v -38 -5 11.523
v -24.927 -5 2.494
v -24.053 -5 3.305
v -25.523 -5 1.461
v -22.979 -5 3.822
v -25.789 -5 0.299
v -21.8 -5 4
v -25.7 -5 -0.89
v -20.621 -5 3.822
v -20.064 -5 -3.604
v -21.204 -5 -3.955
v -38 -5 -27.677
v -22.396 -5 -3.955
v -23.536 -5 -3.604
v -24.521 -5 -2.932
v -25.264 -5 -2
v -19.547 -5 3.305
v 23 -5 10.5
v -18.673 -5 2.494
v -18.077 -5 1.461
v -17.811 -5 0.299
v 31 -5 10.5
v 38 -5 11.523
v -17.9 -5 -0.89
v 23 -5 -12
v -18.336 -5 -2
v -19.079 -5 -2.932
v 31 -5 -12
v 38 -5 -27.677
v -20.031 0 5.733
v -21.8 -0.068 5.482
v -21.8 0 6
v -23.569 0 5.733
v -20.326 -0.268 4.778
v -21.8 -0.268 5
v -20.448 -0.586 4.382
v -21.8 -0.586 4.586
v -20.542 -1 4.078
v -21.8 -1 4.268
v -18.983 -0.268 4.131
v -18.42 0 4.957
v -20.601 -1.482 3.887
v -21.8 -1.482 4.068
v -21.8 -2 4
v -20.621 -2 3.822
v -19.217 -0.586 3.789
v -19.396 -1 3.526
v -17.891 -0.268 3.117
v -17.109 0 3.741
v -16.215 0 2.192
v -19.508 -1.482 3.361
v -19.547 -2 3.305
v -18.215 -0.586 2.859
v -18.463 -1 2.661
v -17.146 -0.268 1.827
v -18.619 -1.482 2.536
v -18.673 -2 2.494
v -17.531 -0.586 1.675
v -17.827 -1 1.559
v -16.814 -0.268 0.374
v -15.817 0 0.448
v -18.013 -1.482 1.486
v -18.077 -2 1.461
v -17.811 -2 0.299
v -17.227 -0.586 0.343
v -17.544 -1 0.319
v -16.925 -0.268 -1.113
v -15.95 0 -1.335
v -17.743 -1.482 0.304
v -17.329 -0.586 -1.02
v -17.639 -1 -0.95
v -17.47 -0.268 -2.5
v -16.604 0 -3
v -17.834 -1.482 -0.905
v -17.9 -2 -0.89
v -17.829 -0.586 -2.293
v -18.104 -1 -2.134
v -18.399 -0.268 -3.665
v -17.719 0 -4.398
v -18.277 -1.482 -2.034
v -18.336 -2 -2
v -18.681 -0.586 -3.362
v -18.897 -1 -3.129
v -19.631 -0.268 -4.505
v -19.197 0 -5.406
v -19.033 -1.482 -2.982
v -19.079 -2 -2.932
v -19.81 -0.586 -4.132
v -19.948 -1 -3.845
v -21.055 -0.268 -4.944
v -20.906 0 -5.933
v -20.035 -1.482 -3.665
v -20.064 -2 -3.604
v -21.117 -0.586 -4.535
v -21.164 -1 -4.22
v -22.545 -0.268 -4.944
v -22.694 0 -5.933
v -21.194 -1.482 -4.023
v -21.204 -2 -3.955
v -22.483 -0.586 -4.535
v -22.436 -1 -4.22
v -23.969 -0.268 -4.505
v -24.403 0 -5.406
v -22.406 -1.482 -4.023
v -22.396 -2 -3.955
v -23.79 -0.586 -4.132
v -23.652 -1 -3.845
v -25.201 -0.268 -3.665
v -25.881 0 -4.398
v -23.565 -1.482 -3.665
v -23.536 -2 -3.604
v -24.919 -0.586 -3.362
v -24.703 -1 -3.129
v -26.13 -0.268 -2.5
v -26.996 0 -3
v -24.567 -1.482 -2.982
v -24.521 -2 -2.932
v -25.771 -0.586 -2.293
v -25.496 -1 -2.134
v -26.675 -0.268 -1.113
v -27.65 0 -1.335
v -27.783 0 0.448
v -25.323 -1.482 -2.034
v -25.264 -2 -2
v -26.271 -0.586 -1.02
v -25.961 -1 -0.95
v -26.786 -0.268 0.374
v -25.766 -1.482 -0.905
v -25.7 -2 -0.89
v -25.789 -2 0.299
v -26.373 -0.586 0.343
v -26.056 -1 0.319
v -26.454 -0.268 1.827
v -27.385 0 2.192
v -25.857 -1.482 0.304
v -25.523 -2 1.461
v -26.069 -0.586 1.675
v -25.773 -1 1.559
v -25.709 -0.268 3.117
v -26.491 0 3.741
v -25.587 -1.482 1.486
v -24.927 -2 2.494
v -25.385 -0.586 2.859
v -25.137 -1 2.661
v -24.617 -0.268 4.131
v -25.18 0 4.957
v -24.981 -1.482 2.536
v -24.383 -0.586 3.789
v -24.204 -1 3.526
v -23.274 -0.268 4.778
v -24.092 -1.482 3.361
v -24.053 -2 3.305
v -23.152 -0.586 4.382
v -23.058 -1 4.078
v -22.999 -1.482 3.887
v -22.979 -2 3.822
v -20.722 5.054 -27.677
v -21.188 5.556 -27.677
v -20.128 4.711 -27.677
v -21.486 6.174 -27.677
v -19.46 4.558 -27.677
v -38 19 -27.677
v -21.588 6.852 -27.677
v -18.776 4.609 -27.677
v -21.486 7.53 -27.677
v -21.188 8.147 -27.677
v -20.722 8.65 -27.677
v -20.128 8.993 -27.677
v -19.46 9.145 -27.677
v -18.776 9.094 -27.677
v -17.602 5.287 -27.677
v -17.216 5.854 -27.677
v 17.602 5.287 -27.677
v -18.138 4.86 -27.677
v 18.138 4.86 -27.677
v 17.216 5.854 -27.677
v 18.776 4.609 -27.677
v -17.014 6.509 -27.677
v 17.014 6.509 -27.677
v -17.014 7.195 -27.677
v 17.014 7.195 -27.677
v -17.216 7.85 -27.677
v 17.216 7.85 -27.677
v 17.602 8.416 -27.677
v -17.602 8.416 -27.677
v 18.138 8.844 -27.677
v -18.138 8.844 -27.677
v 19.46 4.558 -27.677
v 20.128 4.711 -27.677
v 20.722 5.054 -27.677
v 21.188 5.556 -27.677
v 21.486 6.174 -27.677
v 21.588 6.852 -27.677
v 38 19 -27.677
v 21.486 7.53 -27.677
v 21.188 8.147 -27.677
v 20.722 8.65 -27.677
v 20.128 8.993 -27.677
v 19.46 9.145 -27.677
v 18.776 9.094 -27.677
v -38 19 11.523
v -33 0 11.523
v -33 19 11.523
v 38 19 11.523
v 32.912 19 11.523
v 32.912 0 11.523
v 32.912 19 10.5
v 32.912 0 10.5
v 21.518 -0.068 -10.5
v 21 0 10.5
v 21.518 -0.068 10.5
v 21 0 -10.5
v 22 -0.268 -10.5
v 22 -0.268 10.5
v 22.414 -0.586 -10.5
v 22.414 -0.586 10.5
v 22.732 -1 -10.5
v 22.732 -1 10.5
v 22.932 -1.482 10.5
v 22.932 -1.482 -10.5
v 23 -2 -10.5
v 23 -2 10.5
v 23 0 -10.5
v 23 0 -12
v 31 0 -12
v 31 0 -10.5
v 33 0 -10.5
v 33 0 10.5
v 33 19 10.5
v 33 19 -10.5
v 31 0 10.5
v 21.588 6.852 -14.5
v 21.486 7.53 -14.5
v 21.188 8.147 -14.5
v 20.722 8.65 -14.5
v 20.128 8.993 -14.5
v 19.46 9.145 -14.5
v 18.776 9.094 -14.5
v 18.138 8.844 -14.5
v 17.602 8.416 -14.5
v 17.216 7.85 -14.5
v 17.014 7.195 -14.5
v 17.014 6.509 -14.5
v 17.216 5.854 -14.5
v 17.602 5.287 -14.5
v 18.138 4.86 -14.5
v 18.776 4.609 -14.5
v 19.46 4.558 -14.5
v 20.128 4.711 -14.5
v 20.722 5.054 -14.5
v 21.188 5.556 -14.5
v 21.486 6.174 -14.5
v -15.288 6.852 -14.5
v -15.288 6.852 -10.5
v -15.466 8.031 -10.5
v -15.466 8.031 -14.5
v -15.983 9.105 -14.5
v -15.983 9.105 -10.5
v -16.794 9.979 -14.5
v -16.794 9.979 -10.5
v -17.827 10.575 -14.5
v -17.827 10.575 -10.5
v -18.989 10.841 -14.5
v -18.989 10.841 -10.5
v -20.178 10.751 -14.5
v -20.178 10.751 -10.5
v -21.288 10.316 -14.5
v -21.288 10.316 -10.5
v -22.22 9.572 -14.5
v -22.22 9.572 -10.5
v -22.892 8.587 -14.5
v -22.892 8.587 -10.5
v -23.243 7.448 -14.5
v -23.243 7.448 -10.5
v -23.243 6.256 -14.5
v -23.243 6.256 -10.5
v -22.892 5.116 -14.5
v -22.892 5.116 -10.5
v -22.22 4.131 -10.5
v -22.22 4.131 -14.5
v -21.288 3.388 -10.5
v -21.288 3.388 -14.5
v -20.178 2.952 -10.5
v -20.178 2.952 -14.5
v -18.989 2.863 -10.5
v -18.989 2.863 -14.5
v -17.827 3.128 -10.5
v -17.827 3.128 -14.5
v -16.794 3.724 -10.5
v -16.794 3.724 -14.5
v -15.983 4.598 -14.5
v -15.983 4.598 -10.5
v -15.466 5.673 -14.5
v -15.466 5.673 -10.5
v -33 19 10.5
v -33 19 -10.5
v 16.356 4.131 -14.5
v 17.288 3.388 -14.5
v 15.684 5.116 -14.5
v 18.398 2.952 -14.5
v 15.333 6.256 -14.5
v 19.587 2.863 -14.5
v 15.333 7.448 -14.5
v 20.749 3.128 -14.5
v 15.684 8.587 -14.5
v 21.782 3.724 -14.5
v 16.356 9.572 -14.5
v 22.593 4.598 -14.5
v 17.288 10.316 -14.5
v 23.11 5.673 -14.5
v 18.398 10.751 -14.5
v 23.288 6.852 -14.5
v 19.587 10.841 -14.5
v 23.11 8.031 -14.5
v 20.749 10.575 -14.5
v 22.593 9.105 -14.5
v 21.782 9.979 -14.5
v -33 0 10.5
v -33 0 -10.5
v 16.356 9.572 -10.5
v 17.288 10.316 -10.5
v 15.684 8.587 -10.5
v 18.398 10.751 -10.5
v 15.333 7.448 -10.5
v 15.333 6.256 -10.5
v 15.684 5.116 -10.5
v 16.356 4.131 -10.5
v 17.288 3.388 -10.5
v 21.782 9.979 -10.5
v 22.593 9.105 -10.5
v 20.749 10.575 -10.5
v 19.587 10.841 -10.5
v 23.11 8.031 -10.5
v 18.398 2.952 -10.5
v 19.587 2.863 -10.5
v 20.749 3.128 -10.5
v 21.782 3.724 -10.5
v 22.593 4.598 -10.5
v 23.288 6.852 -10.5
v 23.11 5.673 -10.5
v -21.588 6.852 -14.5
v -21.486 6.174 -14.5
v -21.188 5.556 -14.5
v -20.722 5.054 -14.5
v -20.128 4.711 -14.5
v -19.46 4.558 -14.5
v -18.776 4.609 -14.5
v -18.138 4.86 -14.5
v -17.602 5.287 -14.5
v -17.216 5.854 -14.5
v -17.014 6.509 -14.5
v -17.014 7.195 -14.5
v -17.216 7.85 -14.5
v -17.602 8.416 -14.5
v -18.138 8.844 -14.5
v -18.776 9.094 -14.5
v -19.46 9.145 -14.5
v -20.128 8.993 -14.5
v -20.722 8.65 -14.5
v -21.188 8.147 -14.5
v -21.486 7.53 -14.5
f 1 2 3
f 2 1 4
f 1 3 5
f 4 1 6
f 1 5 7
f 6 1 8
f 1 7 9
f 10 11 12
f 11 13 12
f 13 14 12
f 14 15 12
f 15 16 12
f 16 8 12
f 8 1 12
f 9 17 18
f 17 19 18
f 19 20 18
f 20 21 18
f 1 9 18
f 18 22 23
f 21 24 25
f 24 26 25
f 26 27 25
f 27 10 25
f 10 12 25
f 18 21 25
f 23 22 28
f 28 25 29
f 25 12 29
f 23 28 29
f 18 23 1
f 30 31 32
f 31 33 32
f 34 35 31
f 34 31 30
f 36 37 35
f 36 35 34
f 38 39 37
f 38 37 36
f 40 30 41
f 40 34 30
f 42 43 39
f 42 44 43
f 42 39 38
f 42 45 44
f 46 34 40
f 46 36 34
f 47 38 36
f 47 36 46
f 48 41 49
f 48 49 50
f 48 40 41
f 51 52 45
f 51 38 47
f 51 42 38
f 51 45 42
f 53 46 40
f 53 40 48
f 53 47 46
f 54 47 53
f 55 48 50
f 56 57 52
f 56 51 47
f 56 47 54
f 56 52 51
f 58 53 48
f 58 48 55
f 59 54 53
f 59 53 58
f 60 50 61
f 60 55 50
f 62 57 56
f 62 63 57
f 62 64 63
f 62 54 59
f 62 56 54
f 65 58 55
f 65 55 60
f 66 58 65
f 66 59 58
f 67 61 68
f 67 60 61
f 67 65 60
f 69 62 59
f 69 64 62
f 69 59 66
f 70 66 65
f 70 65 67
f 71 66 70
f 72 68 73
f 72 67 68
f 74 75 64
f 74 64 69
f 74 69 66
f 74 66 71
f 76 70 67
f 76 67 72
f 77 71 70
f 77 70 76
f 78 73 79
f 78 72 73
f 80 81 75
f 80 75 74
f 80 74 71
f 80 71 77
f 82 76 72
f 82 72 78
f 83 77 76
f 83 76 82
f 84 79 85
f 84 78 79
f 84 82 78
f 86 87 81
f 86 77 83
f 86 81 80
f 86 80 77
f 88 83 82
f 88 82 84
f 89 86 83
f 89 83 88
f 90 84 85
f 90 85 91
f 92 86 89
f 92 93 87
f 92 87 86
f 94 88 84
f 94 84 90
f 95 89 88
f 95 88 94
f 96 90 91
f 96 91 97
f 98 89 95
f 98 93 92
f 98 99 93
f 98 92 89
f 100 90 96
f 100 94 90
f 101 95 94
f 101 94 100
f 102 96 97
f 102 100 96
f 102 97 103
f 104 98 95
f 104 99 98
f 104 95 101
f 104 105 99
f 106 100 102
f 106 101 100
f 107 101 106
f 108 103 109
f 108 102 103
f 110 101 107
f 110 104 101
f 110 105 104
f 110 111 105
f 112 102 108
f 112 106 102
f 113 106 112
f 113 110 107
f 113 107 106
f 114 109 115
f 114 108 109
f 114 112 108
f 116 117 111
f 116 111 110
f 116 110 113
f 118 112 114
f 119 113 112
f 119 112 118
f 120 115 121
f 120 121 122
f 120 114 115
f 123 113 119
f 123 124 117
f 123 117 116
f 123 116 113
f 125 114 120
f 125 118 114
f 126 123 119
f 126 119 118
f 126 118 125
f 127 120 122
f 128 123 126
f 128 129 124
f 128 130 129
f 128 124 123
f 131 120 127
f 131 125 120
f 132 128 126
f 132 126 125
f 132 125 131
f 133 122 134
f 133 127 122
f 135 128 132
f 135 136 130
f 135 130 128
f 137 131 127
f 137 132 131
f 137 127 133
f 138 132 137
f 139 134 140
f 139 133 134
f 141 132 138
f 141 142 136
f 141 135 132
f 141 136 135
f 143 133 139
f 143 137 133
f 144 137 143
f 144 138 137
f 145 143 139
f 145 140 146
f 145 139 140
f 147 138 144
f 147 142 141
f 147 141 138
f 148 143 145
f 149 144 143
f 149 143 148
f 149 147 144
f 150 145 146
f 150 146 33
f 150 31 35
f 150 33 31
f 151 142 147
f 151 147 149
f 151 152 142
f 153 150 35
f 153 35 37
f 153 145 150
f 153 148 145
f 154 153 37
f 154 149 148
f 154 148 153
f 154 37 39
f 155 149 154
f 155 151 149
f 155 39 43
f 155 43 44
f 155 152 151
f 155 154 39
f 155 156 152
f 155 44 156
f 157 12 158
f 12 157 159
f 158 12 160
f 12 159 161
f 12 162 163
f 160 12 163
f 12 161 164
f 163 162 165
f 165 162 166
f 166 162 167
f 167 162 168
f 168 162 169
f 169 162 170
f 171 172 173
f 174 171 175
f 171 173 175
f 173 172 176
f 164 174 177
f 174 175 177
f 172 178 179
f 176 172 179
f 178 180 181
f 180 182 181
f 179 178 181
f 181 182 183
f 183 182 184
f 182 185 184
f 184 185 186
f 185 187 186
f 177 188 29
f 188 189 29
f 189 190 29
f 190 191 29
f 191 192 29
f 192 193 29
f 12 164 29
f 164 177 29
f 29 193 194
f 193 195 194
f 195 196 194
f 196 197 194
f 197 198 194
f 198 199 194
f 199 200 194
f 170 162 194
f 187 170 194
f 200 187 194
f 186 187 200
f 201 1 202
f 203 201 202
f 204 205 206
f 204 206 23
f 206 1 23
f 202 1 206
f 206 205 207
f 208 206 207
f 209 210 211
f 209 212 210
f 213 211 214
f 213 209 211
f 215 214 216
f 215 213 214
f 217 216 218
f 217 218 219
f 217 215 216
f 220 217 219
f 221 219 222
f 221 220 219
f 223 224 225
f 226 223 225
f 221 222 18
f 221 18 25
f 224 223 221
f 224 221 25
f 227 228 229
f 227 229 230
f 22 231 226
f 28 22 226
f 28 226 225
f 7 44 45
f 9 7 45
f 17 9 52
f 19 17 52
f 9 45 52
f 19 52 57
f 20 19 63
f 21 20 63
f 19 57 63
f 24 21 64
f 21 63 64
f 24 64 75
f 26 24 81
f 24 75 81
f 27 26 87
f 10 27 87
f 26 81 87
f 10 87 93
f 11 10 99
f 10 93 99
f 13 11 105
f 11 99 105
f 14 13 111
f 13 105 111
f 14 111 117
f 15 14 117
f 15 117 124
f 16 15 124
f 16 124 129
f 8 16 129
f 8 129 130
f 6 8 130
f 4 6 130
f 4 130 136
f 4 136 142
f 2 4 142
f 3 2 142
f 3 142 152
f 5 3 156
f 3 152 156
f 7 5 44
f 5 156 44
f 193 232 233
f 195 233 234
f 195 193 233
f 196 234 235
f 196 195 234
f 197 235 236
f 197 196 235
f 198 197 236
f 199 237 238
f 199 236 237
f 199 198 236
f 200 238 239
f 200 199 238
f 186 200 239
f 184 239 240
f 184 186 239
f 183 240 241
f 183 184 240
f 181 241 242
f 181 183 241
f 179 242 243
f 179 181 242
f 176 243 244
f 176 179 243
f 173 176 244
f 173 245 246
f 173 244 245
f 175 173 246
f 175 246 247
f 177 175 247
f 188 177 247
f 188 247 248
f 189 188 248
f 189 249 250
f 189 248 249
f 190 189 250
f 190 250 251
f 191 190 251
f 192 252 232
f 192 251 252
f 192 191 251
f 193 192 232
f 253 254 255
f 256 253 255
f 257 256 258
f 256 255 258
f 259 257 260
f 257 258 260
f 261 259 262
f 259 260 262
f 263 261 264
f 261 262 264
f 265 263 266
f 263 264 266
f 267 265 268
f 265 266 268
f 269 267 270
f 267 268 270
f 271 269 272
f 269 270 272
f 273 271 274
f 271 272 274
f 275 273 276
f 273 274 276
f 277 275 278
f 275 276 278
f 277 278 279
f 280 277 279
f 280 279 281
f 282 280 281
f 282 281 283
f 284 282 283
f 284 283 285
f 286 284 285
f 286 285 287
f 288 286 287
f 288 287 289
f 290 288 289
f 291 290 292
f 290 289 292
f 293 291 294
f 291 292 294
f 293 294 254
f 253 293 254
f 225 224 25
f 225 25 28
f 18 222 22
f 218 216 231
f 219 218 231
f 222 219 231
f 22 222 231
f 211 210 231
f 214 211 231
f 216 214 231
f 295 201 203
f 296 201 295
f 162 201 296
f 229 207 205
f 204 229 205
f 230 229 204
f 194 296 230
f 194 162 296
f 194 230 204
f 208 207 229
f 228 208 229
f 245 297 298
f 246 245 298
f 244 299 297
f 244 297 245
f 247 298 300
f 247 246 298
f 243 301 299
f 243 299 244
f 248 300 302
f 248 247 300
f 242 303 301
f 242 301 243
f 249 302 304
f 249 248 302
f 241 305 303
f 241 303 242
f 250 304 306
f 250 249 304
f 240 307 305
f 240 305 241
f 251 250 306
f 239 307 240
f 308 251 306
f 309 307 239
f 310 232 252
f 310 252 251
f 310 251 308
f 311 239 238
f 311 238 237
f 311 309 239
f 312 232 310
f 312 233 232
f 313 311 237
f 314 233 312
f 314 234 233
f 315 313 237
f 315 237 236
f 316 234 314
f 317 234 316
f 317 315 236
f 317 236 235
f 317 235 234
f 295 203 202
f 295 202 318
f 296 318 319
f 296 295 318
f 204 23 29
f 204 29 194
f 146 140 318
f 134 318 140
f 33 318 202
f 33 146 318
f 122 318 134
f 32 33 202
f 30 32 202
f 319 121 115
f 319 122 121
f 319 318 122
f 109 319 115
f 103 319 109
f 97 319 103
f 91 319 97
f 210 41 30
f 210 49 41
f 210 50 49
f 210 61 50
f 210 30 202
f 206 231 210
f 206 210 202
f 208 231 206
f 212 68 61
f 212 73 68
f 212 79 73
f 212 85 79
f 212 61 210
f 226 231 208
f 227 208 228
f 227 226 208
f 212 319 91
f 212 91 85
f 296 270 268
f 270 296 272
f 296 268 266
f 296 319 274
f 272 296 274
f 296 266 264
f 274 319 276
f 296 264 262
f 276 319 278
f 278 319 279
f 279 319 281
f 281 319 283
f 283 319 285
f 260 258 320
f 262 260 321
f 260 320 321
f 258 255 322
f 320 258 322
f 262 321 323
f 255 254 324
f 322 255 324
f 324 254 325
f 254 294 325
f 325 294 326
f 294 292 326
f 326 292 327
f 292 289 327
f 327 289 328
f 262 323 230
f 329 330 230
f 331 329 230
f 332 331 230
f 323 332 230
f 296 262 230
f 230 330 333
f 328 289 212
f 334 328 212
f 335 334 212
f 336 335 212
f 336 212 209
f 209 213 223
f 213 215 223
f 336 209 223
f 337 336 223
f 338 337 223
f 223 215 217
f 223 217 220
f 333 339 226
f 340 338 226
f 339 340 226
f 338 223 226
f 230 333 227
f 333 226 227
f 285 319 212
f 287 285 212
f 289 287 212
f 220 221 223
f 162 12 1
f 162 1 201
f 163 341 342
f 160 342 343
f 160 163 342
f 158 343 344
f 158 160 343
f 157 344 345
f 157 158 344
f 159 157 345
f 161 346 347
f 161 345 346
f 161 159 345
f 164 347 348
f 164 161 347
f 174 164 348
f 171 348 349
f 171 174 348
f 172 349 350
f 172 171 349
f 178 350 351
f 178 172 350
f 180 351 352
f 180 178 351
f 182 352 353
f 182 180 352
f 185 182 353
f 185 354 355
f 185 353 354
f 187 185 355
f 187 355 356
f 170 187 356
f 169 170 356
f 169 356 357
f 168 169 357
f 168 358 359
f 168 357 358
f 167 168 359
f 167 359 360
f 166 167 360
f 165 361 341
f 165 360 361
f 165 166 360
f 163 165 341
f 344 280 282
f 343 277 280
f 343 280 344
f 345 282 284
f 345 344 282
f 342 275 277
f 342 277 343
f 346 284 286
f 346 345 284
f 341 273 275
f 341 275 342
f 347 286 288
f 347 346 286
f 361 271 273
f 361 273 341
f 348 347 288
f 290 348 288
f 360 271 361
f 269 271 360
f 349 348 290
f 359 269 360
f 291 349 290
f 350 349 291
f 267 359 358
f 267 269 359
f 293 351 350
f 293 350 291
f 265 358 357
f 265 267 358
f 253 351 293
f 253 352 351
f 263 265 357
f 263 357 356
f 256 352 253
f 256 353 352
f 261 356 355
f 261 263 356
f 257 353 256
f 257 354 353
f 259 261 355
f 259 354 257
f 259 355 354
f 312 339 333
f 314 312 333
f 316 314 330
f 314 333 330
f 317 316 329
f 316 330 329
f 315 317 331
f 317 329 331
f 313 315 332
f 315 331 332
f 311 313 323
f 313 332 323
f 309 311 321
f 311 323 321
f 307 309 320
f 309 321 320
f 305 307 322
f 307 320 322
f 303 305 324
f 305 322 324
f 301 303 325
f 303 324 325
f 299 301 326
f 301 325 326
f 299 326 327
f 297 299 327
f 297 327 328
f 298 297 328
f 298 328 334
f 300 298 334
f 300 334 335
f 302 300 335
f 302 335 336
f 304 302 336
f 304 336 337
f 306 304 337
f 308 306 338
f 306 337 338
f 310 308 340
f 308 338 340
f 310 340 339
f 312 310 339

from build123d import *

# Parameters (mm, degrees)
SKETCH_1_W               = 76
SKETCH_1_H               = 31
SKETCH_1_W_2             = 66
SKETCH_1_H_2             = 21
EXTRUDE_1_DEPTH          = 19
SKETCH_3_W               = 76
SKETCH_3_H               = 31
SKETCH_3_R               = 4
SKETCH_3_W_2             = 8
SKETCH_3_H_2             = 22.5
EXTRUDE_3_DEPTH          = 5
FILLET_1_R               = 2
FILLET_2_R               = 2
CUT_EXTRUDE_2_DEPTH      = 46.224440295
CUT_EXTRUDE_2_DEPTH_BACK = 46.224440295
SKETCH_5_W               = 76.758909218
SKETCH_5_H               = 3.977461231
SKETCH_6_W               = 76
SKETCH_6_H               = 24
EXTRUDE_4_DEPTH          = 12.177461231
SKETCH_8_R               = 2.3
CUT_EXTRUDE_5_DEPTH      = 58.806920001
SKETCH_13_W              = 65.911954831
SKETCH_13_H              = 1.022538769
CUT_EXTRUDE_6_DEPTH      = 19
SKETCH_14_R              = 4
CUT_EXTRUDE_7_DEPTH      = 4


with BuildPart() as part:
    # 草圖1 → 填料-伸長1 (new body)
    with BuildSketch(Plane(origin=(0, 0, 0), x_dir=(1, 0, 0), z_dir=(0, 1, 0))):
        Rectangle(SKETCH_1_W, SKETCH_1_H)
        Rectangle(SKETCH_1_W_2, SKETCH_1_H_2, mode=Mode.SUBTRACT)
    extrude(amount=EXTRUDE_1_DEPTH)

    # 草圖3 → 填料-伸長3 (add)
    with BuildSketch(Plane(origin=(0, 0, 0), x_dir=(1, 0, 0), z_dir=(0, 1, 0))):
        Rectangle(SKETCH_3_W, SKETCH_3_H)
        with Locations(Location((-21.8, 0, 0), (0, 0, 270))):
            Circle(SKETCH_3_R, mode=Mode.SUBTRACT)
        with Locations((27, 0.75)):
            Rectangle(SKETCH_3_W_2, SKETCH_3_H_2, mode=Mode.SUBTRACT)
    extrude(amount=-EXTRUDE_3_DEPTH)

    # 圓角1
    fillet_1_edges = [part.edges().sort_by_distance(p)[0] for p in [
        (-21.8, 0, -4),
    ]]
    fillet(fillet_1_edges, radius=FILLET_1_R)

    # 圓角2
    fillet_2_edges = [part.edges().sort_by_distance(p)[0] for p in [
        (23, 0, 0),
    ]]
    fillet(fillet_2_edges, radius=FILLET_2_R)

    # 草圖5 → 除料-伸長2 (cut, two sides: drawn at the far end of the back side and taken through both)
    with BuildSketch(Plane(origin=(0, 0, 0), x_dir=(1, 0, 0), z_dir=(0, 1, 0)).offset(-CUT_EXTRUDE_2_DEPTH_BACK)):
        with Locations((0.379454609, -13.511269385)):
            Rectangle(SKETCH_5_W, SKETCH_5_H)
    extrude(amount=CUT_EXTRUDE_2_DEPTH + CUT_EXTRUDE_2_DEPTH_BACK, mode=Mode.SUBTRACT)

    # 草圖6 → 填料-伸長4 (add)
    with BuildSketch(Plane.XY.offset(-27.677461231)):
        with Locations((0, 7)):
            Rectangle(SKETCH_6_W, SKETCH_6_H)
    extrude(amount=EXTRUDE_4_DEPTH)

    # 草圖8 → 除料-伸長5 (cut, through all)
    with BuildSketch(Plane.XY.offset(-27.677461231)):
        with Locations((19.287892817, 6.851763466)):
            Circle(SKETCH_8_R)
        with Locations(Location((-19.287892817, 6.851763466, 0), (0, 0, 180))):
            Circle(SKETCH_8_R)
    extrude(amount=CUT_EXTRUDE_5_DEPTH, mode=Mode.SUBTRACT)

    # 草圖13 → 除料-伸長6 (cut)
    with BuildSketch(Plane(origin=(0, 19, 0), x_dir=(1, 0, 0), z_dir=(0, 1, 0))):
        with Locations((-0.044022584, -11.011269385)):
            Rectangle(SKETCH_13_W, SKETCH_13_H)
    extrude(amount=-CUT_EXTRUDE_6_DEPTH, mode=Mode.SUBTRACT)

    # 草圖14 → 除料-伸長7 (cut)
    with BuildSketch(Plane.XY.offset(-10.5)):
        with Locations((-19.287892817, 6.851763466)):
            Circle(SKETCH_14_R)
        with Locations((19.287892817, 6.851763466)):
            Circle(SKETCH_14_R)
    extrude(amount=-CUT_EXTRUDE_7_DEPTH, mode=Mode.SUBTRACT)


solid = part.part
